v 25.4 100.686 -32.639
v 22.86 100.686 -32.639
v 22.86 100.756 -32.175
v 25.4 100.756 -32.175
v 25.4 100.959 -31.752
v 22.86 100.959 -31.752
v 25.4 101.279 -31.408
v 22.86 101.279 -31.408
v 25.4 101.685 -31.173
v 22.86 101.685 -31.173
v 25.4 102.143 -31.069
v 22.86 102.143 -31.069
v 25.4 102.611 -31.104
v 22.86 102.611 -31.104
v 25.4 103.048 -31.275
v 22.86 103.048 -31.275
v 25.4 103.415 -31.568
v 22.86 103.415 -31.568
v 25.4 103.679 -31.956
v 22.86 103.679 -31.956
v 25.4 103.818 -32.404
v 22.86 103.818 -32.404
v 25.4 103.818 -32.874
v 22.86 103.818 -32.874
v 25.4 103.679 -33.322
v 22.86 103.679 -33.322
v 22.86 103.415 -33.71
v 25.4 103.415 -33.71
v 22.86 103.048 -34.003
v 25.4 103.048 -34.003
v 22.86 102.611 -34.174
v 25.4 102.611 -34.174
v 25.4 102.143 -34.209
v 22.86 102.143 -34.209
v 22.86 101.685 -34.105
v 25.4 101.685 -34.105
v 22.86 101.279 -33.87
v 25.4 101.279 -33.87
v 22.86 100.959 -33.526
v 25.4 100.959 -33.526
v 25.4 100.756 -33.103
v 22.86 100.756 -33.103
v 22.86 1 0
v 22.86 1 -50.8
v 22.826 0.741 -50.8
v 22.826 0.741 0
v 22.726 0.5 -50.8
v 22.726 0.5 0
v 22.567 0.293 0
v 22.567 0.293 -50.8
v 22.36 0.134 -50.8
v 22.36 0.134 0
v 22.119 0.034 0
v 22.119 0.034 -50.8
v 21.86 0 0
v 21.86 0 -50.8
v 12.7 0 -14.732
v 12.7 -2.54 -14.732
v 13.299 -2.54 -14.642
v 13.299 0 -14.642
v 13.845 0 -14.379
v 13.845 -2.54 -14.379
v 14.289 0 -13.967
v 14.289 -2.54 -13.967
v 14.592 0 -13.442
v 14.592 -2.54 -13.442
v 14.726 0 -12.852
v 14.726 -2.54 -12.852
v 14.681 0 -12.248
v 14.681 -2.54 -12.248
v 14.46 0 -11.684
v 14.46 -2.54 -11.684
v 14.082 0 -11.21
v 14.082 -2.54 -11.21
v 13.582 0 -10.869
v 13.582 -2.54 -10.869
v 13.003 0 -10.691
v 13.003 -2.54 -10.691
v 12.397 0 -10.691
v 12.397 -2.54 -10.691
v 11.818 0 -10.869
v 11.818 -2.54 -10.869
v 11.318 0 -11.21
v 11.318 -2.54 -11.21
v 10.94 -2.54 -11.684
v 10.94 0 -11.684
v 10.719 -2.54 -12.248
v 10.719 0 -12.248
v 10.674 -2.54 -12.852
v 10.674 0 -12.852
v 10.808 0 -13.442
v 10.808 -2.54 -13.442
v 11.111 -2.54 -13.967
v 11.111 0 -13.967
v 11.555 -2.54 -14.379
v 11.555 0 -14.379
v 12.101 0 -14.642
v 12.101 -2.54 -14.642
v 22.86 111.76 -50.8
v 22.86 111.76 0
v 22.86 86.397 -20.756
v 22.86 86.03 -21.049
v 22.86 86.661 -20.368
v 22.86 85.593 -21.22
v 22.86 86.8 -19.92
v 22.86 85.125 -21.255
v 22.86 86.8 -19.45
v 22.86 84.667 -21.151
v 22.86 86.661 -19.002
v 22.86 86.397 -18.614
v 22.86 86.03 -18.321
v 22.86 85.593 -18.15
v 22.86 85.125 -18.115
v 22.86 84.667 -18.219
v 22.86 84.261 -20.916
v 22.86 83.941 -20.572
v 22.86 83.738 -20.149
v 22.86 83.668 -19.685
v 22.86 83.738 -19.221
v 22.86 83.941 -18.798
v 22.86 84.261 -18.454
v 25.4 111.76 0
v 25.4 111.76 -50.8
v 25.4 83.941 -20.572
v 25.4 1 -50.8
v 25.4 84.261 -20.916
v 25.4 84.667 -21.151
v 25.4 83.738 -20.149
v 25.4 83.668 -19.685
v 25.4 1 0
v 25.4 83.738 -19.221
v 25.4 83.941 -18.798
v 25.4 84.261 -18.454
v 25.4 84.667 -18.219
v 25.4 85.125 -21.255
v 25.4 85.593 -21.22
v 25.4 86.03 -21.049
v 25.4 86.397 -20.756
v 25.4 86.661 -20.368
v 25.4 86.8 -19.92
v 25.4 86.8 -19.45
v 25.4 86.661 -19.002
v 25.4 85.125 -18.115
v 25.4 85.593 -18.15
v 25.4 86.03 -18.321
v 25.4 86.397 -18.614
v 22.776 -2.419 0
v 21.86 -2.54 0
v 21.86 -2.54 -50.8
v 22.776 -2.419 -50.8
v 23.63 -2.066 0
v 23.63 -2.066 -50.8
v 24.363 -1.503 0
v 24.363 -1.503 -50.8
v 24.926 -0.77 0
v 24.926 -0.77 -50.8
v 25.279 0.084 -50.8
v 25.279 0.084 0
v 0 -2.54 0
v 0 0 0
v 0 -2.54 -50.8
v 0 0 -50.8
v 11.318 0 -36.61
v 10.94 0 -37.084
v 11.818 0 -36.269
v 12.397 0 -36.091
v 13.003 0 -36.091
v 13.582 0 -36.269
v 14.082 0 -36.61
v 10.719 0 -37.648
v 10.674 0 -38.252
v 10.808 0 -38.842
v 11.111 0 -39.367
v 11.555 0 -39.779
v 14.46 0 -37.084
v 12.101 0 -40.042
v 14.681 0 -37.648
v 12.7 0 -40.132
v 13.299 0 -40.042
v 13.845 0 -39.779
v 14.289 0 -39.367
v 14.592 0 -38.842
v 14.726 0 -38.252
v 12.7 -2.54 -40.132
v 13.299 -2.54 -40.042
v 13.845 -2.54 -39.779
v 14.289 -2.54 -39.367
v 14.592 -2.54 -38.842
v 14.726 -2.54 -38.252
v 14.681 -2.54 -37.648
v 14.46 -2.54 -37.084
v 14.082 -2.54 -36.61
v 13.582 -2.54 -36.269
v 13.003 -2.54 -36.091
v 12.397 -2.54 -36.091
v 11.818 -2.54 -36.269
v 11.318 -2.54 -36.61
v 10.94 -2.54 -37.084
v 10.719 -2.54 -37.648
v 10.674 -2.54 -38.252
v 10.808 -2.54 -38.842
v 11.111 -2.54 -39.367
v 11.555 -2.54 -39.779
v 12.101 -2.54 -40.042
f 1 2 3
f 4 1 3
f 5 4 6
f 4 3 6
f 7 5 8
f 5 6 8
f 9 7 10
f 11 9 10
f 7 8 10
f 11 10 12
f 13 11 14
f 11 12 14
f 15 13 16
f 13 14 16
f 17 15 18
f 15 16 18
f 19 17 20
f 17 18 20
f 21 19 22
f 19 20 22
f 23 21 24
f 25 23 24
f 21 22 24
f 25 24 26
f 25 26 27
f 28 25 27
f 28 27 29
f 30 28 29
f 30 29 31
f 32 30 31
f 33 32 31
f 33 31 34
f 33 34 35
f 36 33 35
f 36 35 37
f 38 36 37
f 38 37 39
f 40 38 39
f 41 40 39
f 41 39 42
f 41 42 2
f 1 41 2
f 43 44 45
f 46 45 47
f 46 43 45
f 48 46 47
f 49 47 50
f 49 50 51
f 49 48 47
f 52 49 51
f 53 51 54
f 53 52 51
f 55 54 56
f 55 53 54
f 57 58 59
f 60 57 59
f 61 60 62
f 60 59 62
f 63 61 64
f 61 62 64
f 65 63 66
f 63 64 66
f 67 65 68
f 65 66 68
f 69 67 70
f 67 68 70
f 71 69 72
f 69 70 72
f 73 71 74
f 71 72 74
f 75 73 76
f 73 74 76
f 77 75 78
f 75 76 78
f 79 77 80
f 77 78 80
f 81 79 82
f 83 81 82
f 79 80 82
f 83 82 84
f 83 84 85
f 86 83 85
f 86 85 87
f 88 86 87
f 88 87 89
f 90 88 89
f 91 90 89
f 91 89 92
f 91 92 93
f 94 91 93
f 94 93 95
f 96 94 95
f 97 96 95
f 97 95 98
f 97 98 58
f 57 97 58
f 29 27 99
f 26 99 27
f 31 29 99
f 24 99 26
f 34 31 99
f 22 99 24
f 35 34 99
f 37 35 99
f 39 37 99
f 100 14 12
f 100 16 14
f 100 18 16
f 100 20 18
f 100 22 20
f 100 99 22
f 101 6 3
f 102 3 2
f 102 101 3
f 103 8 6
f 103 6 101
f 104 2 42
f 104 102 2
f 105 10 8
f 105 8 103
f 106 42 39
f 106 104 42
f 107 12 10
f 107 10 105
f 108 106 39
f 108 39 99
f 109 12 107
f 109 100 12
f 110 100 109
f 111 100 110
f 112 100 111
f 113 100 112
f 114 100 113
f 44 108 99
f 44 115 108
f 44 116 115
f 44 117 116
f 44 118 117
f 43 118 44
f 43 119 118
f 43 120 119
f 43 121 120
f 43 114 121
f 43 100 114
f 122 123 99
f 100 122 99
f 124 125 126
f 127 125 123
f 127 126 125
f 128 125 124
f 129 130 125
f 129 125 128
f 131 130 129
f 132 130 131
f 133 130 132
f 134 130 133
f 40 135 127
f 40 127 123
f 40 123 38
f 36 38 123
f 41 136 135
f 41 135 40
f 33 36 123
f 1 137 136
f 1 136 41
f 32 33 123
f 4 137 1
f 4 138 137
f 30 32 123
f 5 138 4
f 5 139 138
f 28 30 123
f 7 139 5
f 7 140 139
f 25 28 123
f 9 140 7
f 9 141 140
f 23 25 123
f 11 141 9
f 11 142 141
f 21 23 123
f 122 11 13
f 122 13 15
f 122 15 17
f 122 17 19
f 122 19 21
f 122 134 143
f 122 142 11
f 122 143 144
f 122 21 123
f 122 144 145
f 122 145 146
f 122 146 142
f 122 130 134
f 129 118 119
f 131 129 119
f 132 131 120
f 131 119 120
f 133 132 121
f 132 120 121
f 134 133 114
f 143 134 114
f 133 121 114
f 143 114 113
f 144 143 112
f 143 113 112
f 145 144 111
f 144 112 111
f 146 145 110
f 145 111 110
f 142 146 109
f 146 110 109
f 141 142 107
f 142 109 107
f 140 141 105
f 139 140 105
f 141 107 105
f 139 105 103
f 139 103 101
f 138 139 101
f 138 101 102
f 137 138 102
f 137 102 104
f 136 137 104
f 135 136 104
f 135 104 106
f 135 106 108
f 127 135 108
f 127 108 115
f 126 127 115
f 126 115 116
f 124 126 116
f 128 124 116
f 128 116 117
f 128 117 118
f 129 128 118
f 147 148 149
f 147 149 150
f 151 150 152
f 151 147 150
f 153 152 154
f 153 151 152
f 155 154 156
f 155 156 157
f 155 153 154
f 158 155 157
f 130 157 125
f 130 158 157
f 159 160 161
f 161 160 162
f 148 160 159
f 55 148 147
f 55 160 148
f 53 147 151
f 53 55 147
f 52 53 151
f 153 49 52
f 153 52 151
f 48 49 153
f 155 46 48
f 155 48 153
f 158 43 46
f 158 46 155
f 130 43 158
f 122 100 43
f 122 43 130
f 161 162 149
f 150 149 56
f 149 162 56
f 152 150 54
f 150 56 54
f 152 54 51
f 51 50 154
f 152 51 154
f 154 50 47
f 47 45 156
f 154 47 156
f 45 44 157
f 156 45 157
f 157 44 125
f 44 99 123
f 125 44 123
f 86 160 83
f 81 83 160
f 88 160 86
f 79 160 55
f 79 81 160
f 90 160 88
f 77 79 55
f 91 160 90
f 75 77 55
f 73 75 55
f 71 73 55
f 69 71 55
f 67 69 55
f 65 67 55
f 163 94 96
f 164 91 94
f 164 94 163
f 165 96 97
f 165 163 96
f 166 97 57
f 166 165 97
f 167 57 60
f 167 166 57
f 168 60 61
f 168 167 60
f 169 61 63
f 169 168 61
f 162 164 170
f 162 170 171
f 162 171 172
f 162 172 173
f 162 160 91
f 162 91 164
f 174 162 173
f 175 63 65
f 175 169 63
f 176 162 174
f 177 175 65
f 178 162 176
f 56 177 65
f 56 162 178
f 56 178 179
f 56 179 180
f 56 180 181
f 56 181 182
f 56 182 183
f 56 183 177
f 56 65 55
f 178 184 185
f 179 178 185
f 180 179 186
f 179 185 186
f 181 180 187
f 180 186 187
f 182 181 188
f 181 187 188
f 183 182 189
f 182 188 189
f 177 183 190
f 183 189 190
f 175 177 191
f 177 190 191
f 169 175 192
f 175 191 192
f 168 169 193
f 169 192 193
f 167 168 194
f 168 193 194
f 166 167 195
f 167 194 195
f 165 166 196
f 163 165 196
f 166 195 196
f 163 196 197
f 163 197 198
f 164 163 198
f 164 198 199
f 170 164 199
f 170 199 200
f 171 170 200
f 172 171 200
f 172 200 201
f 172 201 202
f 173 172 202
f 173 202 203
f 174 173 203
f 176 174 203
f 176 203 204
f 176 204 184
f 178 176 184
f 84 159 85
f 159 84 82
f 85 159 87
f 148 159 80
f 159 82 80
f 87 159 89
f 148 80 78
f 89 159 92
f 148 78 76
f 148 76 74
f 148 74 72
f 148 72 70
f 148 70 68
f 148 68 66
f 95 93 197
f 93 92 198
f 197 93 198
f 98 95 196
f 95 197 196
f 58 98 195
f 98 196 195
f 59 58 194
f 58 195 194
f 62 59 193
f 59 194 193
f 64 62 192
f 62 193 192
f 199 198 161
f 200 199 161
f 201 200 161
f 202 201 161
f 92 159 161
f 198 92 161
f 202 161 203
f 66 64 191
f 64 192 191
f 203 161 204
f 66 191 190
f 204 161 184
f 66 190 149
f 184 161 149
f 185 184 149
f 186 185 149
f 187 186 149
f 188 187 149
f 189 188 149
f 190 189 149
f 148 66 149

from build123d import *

# Parameters (mm, degrees)
SKETCH2_W                    = 25.4
SKETCH2_H                    = 50.8
BASE_FLANGE1_DEPTH           = 2.54
EDGE_FLANGE1_STRIP_W         = 12.16
EDGE_FLANGE1_STRIP_H         = 2.54
EDGE_FLANGE1_STRIP_CUT_DEPTH = 50.8
EDGE_FLANGE1_DEPTH           = 50.8
SKETCH10_R                   = 2.032
CUT_EXTRUDE1_DEPTH           = 128.633420388
SKETCH11_R                   = 1.5748
CUT_EXTRUDE2_DEPTH           = 125.874005301


# Sheet-metal steps are written as plain solids
with BuildPart() as part:
    # Sketch2 → Base-Flange1 (new body)
    with BuildSketch(Plane(origin=(0, 0, 0), x_dir=(1, 0, 0), z_dir=(0, 1, 0))):
        with Locations((12.7, 25.4)):
            Rectangle(SKETCH2_W, SKETCH2_H)
    extrude(amount=-BASE_FLANGE1_DEPTH)

    # Edge-Flange1 strip (across the edge) → Edge-Flange1 strip cut (cut)
    with BuildSketch(Plane(origin=(25.4, 0, 0), x_dir=(-1, 0, 0), z_dir=(0, 0, -1))):
        with Locations((-2.54, -1.27)):
            Rectangle(EDGE_FLANGE1_STRIP_W, EDGE_FLANGE1_STRIP_H)
    extrude(amount=EDGE_FLANGE1_STRIP_CUT_DEPTH, mode=Mode.SUBTRACT)

    # Edge-Flange1 section (across the edge) → Edge-Flange1 (add)
    with BuildSketch(Plane(origin=(25.4, 0, 0), x_dir=(-1, 0, 0), z_dir=(0, 0, -1))):
        with BuildLine():
            Line((0, 1), (0, 111.76))
            Line((0, 111.76), (2.54, 111.76))
            Line((2.54, 111.76), (2.54, 1))
            ThreePointArc((2.54, 1), (2.832893219, 0.292893219), (3.54, 0))
            Line((3.54, 0), (3.54, -2.54))
            ThreePointArc((3.54, -2.54), (1.036841995, -1.503158005), (0, 1))
        make_face()
    extrude(amount=EDGE_FLANGE1_DEPTH)

    # Sketch10 → Cut-Extrude1 (cut, through all)
    with BuildSketch(Plane.XZ.offset(2.54)):
        with Locations(Location((12.7, -38.1, 0), (0, 0, 270))):
            Circle(SKETCH10_R)
        with Locations(Location((12.7, -12.7, 0), (0, 0, 270))):
            Circle(SKETCH10_R)
    extrude(amount=-CUT_EXTRUDE1_DEPTH, mode=Mode.SUBTRACT)

    # Sketch11 → Cut-Extrude2 (cut, through all)
    with BuildSketch(Plane.ZY.offset(-22.86)):
        with Locations(Location((-32.639, 102.2604, 0), (0, 0, 270))):
            Circle(SKETCH11_R)
        with Locations(Location((-19.685, 85.2424, 0), (0, 0, 270))):
            Circle(SKETCH11_R)
    extrude(amount=-CUT_EXTRUDE2_DEPTH, mode=Mode.SUBTRACT)


solid = part.part
